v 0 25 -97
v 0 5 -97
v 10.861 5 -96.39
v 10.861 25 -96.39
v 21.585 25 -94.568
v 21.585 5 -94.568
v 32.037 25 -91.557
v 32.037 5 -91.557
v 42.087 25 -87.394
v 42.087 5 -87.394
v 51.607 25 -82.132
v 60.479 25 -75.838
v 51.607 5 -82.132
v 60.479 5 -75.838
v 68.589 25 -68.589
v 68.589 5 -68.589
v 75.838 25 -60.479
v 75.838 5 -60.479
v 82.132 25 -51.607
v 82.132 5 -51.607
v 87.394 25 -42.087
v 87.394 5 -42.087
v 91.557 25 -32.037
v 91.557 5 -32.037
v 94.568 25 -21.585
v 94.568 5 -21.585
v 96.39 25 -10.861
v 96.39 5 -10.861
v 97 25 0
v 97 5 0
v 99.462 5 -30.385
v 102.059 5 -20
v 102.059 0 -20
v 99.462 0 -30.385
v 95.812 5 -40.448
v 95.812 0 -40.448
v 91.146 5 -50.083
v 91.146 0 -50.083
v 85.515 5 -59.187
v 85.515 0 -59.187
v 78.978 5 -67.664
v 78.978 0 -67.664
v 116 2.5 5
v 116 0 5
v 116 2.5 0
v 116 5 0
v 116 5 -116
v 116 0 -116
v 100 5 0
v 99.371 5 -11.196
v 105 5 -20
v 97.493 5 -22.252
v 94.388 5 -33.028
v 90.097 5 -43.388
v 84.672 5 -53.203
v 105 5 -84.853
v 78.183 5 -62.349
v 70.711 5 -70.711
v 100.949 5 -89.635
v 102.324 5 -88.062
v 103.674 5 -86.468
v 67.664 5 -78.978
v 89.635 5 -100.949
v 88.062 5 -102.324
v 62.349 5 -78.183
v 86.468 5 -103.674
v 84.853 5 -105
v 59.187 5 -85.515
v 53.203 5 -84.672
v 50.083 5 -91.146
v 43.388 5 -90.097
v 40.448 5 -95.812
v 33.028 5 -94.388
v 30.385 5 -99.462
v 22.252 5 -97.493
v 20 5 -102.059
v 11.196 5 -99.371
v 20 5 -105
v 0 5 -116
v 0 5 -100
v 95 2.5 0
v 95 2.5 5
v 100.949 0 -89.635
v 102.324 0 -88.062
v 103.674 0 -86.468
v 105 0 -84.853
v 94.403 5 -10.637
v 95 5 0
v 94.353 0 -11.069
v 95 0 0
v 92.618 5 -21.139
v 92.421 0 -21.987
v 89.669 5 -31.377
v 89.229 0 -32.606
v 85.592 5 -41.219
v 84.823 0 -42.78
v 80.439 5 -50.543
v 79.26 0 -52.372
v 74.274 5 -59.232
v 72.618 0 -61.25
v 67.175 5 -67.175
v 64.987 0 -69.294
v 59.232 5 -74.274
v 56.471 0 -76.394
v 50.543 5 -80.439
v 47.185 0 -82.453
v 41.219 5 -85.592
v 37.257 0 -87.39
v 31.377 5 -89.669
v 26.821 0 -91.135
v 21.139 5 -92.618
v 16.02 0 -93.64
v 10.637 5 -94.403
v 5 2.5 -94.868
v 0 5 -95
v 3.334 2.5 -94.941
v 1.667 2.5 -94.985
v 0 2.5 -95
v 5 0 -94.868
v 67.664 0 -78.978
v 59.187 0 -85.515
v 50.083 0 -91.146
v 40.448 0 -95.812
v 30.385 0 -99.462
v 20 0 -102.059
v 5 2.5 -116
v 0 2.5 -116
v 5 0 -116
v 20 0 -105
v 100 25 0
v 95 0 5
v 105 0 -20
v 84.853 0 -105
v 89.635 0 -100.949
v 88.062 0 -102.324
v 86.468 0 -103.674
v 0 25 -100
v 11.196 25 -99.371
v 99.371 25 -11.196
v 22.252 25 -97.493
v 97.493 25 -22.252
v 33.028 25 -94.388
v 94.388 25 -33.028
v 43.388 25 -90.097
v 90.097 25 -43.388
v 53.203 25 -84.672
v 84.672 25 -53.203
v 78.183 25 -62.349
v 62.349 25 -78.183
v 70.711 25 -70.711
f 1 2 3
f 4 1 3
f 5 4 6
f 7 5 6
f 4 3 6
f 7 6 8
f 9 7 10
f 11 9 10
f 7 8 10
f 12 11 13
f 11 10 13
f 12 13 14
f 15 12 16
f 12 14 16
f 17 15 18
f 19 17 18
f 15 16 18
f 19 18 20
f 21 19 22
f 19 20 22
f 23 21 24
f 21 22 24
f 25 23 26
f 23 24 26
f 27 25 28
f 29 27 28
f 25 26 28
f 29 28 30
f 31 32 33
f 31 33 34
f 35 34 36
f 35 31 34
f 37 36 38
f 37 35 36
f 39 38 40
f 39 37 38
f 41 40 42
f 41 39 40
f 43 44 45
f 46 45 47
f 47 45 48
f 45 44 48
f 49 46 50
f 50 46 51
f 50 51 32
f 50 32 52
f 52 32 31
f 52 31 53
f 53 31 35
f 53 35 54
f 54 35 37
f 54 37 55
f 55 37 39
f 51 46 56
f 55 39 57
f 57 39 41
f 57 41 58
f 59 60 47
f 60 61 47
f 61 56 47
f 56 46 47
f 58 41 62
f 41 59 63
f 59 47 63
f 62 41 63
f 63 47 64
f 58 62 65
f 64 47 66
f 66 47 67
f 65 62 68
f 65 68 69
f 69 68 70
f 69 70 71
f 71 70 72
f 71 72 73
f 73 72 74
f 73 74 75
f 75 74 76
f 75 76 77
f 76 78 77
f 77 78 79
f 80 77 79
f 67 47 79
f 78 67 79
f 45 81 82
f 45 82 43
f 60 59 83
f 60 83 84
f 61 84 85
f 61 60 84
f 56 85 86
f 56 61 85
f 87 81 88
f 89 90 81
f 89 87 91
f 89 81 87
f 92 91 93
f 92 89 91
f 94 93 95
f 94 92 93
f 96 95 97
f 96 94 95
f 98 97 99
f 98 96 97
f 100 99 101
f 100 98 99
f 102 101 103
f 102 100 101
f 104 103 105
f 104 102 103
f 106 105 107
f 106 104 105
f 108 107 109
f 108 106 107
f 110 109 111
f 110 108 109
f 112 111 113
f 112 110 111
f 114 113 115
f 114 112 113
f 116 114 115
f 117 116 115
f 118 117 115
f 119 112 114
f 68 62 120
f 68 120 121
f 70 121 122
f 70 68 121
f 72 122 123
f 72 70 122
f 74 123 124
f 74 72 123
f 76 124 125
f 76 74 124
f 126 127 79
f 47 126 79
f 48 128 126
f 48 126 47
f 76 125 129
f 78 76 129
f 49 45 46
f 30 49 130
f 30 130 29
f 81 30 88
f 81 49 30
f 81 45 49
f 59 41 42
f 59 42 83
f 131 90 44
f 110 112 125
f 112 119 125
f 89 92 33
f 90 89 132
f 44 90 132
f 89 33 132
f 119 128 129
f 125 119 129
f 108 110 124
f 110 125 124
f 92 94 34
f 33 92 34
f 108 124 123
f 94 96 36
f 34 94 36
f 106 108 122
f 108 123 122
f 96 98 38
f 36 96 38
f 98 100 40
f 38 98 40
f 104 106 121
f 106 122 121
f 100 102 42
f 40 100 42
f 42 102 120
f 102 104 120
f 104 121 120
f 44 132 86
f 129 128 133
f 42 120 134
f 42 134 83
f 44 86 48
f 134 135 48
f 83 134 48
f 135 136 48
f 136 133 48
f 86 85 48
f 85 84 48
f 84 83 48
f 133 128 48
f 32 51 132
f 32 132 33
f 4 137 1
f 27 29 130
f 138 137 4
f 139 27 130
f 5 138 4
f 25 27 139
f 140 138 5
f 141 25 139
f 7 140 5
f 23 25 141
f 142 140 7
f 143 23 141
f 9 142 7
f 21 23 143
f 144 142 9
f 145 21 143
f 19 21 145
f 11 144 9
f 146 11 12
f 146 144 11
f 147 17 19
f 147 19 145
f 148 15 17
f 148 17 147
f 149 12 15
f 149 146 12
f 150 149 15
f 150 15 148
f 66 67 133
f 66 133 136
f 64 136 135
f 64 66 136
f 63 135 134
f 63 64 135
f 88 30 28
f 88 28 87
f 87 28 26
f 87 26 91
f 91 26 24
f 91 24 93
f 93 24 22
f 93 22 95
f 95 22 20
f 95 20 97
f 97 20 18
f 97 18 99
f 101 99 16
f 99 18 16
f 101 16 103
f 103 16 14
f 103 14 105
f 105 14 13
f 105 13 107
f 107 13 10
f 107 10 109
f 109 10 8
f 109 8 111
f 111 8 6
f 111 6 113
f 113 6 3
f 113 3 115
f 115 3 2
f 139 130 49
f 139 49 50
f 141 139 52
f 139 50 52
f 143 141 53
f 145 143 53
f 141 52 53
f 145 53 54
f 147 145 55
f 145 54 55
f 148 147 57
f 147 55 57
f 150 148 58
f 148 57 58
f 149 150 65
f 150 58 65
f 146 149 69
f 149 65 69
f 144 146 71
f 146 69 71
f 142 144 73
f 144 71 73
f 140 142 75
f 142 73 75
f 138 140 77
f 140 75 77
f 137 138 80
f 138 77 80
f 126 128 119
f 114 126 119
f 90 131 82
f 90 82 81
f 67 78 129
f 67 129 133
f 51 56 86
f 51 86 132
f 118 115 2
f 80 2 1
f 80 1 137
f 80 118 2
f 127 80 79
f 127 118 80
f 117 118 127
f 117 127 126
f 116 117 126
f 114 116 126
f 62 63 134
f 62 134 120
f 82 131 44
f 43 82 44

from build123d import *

# Parameters (mm, degrees)
EXTRUDE_1_DEPTH     = 5
EXTRUDE_2_DEPTH     = 20
CUT_EXTRUDE_1_DEPTH = 166.263426081
CUT_EXTRUDE_2_DEPTH = 2.5
SKETCH_6_W          = 21
SKETCH_6_H          = 5
EXTRUDE_3_DEPTH     = 2.5


with BuildPart() as part:
    # 스케치1 → 보스-돌출1 (new body)
    with BuildSketch(Plane(origin=(0, 0, 0), x_dir=(1, 0, 0), z_dir=(0, 1, 0))):
        with BuildLine():
            Line((0, 95), (0, 116))
            Line((0, 116), (116, 116))
            Line((116, 116), (116, 0))
            Line((116, 0), (95, 0))
            ThreePointArc((95, 0), (67.175144213, 67.175144213), (0, 95))
        make_face()
    extrude(amount=EXTRUDE_1_DEPTH)

    # 스케치2 → 보스-돌출2 (add)
    with BuildSketch(Plane(origin=(0, 5, 0), x_dir=(1, 0, 0), z_dir=(0, 1, 0))):
        with BuildLine():
            Line((97, 0), (100, 0))
            ThreePointArc((100, 0), (70.710678119, 70.710678119), (0, 100))
            Line((0, 100), (0, 97))
            ThreePointArc((0, 97), (68.589357775, 68.589357775), (97, 0))
        make_face()
    extrude(amount=EXTRUDE_2_DEPTH)

    # 스케치3 → 컷-돌출1 (cut, through all)
    with BuildSketch(Plane(origin=(0, 5, 0), x_dir=(1, 0, 0), z_dir=(0, 1, 0))):
        with BuildLine():
            Line((20, 105), (84.852813742, 105))
            ThreePointArc((84.852813742, 105), (87.267323582, 103.002010829), (89.634803308, 100.948511807))
            Line((89.634803308, 100.948511807), (67.66435687, 78.978065369))
            ThreePointArc((67.66435687, 78.978065369), (45.325930989, 93.603204966), (20, 102.058806577))
            Line((20, 102.058806577), (20, 105))
        make_face()
        with BuildLine():
            Line((105, 84.852813742), (105, 20))
            Line((105, 20), (102.058806577, 20))
            ThreePointArc((102.058806577, 20), (93.603204966, 45.325930989), (78.978065369, 67.66435687))
            Line((78.978065369, 67.66435687), (100.948511807, 89.634803308))
            ThreePointArc((100.948511807, 89.634803308), (103.002010829, 87.267323582), (105, 84.852813742))
        make_face()
    extrude(amount=-CUT_EXTRUDE_1_DEPTH, mode=Mode.SUBTRACT)

    # 스케치5 → 컷-돌출2 (cut)
    with BuildSketch(Plane.XZ):
        Polygon((0, -95), (0, -116), (5, -116), (5, -94.868329805), align=None)
    extrude(amount=-CUT_EXTRUDE_2_DEPTH, mode=Mode.SUBTRACT)

    # 스케치6 → 보스-돌출3 (add)
    with BuildSketch(Plane(origin=(0, 0, 0), x_dir=(1, 0, 0), z_dir=(0, 1, 0))):
        with Locations((105.5, -2.5)):
            Rectangle(SKETCH_6_W, SKETCH_6_H)
    extrude(amount=EXTRUDE_3_DEPTH)


solid = part.part
